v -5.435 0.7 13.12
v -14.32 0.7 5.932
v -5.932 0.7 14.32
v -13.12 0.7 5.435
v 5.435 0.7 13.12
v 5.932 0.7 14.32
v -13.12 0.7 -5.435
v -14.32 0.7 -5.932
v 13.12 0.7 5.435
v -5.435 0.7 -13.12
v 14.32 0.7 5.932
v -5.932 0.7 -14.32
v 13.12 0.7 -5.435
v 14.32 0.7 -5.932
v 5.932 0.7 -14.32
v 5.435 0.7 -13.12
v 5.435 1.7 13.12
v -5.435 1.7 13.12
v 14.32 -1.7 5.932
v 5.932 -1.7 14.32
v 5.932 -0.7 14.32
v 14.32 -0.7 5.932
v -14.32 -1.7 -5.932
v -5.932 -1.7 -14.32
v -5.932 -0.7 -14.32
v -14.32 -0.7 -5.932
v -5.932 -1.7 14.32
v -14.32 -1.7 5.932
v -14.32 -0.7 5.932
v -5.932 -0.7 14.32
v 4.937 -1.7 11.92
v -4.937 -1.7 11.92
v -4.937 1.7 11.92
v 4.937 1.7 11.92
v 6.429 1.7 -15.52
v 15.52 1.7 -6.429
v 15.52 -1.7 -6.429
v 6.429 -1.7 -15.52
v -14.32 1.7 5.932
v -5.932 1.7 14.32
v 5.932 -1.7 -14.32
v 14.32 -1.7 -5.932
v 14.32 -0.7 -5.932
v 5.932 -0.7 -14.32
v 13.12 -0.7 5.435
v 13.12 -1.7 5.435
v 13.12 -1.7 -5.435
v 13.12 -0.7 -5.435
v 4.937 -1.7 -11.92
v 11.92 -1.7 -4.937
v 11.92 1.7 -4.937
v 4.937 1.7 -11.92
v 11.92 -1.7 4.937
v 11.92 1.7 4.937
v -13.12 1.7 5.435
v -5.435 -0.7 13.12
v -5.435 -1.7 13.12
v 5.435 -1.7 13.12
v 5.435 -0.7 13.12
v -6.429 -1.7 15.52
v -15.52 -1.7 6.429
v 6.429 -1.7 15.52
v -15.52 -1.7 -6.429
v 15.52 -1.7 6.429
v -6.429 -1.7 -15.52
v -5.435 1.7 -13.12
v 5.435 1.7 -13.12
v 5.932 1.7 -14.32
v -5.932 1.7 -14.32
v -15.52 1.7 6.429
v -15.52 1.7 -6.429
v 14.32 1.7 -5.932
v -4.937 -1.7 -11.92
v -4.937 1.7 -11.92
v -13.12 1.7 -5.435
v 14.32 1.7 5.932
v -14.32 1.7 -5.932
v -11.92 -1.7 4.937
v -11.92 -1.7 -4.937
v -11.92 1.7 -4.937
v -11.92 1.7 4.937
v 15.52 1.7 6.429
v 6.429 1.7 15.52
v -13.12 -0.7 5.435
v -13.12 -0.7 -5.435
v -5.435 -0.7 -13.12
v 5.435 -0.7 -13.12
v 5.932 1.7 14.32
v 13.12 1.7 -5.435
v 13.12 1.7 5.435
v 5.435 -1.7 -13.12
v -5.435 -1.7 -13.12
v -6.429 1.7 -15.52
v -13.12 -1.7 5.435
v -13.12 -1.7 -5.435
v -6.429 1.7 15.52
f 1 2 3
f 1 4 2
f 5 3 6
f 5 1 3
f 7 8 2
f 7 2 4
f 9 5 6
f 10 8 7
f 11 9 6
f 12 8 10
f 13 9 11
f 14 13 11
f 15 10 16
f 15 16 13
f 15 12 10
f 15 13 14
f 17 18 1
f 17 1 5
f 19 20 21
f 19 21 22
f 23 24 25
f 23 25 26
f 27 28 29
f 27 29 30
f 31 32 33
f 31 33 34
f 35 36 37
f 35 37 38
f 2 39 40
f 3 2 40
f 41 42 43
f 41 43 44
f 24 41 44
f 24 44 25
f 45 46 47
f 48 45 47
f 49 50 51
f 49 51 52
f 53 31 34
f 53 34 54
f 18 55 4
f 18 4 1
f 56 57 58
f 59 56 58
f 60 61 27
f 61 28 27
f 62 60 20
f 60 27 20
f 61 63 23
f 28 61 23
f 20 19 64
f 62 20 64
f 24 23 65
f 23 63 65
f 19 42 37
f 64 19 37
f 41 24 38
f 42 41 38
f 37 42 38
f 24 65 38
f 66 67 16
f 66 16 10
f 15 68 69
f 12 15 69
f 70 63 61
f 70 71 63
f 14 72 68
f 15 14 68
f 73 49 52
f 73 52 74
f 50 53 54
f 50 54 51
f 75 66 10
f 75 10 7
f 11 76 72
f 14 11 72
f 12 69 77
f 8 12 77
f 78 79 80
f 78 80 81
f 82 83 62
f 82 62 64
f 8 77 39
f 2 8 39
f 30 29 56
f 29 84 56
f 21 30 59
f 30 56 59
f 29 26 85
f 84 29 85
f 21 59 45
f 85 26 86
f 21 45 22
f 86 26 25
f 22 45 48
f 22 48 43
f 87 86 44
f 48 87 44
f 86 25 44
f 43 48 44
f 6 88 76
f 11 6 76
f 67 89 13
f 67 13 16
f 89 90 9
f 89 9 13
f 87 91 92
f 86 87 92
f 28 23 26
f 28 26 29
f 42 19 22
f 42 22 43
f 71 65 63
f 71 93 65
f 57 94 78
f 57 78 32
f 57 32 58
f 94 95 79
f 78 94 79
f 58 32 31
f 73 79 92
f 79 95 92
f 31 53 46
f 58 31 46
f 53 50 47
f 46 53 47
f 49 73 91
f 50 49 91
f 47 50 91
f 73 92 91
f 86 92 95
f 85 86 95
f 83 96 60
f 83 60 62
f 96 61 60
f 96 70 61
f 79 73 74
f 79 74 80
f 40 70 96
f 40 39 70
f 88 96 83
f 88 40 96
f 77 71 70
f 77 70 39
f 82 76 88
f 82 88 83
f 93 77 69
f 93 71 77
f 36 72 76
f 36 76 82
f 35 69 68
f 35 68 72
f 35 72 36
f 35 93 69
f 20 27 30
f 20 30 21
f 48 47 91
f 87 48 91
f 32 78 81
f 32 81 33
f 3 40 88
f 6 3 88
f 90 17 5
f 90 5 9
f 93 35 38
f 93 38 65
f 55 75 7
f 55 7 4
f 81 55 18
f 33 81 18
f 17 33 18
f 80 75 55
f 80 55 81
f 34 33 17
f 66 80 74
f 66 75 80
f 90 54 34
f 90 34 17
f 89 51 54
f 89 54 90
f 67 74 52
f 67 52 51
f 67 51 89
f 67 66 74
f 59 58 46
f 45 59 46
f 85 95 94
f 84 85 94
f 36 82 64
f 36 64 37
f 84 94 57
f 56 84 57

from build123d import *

# Parameters (mm, degrees)
EXTRUDE_1_DEPTH     = 1.7
CUT_EXTRUDE_3_DEPTH = 1
CUT_EXTRUDE_4_DEPTH = 2.7


with BuildPart() as part:
    # 스케치1 → 보스-돌출1 (new body)
    with BuildSketch(Plane(origin=(0, 0, 0), x_dir=(1, 0, 0), z_dir=(0, 1, 0))):
        Polygon((-15.520132754, -6.428649477), (-6.428649477, -15.520132754), (6.428649477, -15.520132754), (15.520132754, -6.428649477), (15.520132754, 6.428649477), (6.428649477, 15.520132754), (-6.428649477, 15.520132754), (-15.520132754, 6.428649477), align=None)
        Polygon((-5.931593202, -14.320132754), (5.931593202, -14.320132754), (14.320132754, -5.931593202), (14.320132754, 5.931593202), (5.931593202, 14.320132754), (-5.931593202, 14.320132754), (-14.320132754, 5.931593202), (-14.320132754, -5.931593202), align=None, mode=Mode.SUBTRACT)
        Polygon((-14.320132754, -5.931593202), (-5.931593202, -14.320132754), (5.931593202, -14.320132754), (14.320132754, -5.931593202), (14.320132754, 5.931593202), (5.931593202, 14.320132754), (-5.931593202, 14.320132754), (-14.320132754, 5.931593202), align=None)
        Polygon((-5.434536927, -13.120132754), (5.434536927, -13.120132754), (13.120132754, -5.434536927), (13.120132754, 5.434536927), (5.434536927, 13.120132754), (-5.434536927, 13.120132754), (-13.120132754, 5.434536927), (-13.120132754, -5.434536927), align=None, mode=Mode.SUBTRACT)
        Polygon((-13.120132754, -5.434536927), (-5.434536927, -13.120132754), (5.434536927, -13.120132754), (13.120132754, -5.434536927), (13.120132754, 5.434536927), (5.434536927, 13.120132754), (-5.434536927, 13.120132754), (-13.120132754, 5.434536927), align=None)
    extrude_1 = extrude(amount=EXTRUDE_1_DEPTH)

    # 스케치2 → 컷-돌출3 (cut)
    with BuildSketch(Plane(origin=(0, 1.7, 0), x_dir=(1, 0, 0), z_dir=(0, 1, 0))):
        Polygon((-14.320132754, -5.931593202), (-5.931593202, -14.320132754), (5.931593202, -14.320132754), (14.320132754, -5.931593202), (14.320132754, 5.931593202), (5.931593202, 14.320132754), (-5.931593202, 14.320132754), (-14.320132754, 5.931593202), align=None)
        Polygon((-13.120132754, -5.434536927), (-5.434536927, -13.120132754), (5.434536927, -13.120132754), (13.120132754, -5.434536927), (13.120132754, 5.434536927), (5.434536927, 13.120132754), (-5.434536927, 13.120132754), (-13.120132754, 5.434536927), align=None, mode=Mode.SUBTRACT)
    cut_extrude_3 = extrude(amount=-CUT_EXTRUDE_3_DEPTH, mode=Mode.SUBTRACT)

    # 스케치3 → 컷-돌출4 (cut, through all)
    with BuildSketch(Plane(origin=(0, 1.7, 0), x_dir=(1, 0, 0), z_dir=(0, 1, 0))):
        Polygon((-4.937480652, 11.920132754), (-11.920132754, 4.937480652), (-11.920132754, -4.937480652), (-4.937480652, -11.920132754), (4.937480652, -11.920132754), (11.920132754, -4.937480652), (11.920132754, 4.937480652), (4.937480652, 11.920132754), align=None)
    cut_extrude_4 = extrude(amount=-CUT_EXTRUDE_4_DEPTH, mode=Mode.SUBTRACT)

    # 대칭 복사1: 보스-돌출1, 컷-돌출3, 컷-돌출4 across plane
    add(extrude_1.mirror(Plane.ZX))
    add(cut_extrude_3.mirror(Plane.ZX), mode=Mode.SUBTRACT)
    add(cut_extrude_4.mirror(Plane.ZX), mode=Mode.SUBTRACT)


solid = part.part
